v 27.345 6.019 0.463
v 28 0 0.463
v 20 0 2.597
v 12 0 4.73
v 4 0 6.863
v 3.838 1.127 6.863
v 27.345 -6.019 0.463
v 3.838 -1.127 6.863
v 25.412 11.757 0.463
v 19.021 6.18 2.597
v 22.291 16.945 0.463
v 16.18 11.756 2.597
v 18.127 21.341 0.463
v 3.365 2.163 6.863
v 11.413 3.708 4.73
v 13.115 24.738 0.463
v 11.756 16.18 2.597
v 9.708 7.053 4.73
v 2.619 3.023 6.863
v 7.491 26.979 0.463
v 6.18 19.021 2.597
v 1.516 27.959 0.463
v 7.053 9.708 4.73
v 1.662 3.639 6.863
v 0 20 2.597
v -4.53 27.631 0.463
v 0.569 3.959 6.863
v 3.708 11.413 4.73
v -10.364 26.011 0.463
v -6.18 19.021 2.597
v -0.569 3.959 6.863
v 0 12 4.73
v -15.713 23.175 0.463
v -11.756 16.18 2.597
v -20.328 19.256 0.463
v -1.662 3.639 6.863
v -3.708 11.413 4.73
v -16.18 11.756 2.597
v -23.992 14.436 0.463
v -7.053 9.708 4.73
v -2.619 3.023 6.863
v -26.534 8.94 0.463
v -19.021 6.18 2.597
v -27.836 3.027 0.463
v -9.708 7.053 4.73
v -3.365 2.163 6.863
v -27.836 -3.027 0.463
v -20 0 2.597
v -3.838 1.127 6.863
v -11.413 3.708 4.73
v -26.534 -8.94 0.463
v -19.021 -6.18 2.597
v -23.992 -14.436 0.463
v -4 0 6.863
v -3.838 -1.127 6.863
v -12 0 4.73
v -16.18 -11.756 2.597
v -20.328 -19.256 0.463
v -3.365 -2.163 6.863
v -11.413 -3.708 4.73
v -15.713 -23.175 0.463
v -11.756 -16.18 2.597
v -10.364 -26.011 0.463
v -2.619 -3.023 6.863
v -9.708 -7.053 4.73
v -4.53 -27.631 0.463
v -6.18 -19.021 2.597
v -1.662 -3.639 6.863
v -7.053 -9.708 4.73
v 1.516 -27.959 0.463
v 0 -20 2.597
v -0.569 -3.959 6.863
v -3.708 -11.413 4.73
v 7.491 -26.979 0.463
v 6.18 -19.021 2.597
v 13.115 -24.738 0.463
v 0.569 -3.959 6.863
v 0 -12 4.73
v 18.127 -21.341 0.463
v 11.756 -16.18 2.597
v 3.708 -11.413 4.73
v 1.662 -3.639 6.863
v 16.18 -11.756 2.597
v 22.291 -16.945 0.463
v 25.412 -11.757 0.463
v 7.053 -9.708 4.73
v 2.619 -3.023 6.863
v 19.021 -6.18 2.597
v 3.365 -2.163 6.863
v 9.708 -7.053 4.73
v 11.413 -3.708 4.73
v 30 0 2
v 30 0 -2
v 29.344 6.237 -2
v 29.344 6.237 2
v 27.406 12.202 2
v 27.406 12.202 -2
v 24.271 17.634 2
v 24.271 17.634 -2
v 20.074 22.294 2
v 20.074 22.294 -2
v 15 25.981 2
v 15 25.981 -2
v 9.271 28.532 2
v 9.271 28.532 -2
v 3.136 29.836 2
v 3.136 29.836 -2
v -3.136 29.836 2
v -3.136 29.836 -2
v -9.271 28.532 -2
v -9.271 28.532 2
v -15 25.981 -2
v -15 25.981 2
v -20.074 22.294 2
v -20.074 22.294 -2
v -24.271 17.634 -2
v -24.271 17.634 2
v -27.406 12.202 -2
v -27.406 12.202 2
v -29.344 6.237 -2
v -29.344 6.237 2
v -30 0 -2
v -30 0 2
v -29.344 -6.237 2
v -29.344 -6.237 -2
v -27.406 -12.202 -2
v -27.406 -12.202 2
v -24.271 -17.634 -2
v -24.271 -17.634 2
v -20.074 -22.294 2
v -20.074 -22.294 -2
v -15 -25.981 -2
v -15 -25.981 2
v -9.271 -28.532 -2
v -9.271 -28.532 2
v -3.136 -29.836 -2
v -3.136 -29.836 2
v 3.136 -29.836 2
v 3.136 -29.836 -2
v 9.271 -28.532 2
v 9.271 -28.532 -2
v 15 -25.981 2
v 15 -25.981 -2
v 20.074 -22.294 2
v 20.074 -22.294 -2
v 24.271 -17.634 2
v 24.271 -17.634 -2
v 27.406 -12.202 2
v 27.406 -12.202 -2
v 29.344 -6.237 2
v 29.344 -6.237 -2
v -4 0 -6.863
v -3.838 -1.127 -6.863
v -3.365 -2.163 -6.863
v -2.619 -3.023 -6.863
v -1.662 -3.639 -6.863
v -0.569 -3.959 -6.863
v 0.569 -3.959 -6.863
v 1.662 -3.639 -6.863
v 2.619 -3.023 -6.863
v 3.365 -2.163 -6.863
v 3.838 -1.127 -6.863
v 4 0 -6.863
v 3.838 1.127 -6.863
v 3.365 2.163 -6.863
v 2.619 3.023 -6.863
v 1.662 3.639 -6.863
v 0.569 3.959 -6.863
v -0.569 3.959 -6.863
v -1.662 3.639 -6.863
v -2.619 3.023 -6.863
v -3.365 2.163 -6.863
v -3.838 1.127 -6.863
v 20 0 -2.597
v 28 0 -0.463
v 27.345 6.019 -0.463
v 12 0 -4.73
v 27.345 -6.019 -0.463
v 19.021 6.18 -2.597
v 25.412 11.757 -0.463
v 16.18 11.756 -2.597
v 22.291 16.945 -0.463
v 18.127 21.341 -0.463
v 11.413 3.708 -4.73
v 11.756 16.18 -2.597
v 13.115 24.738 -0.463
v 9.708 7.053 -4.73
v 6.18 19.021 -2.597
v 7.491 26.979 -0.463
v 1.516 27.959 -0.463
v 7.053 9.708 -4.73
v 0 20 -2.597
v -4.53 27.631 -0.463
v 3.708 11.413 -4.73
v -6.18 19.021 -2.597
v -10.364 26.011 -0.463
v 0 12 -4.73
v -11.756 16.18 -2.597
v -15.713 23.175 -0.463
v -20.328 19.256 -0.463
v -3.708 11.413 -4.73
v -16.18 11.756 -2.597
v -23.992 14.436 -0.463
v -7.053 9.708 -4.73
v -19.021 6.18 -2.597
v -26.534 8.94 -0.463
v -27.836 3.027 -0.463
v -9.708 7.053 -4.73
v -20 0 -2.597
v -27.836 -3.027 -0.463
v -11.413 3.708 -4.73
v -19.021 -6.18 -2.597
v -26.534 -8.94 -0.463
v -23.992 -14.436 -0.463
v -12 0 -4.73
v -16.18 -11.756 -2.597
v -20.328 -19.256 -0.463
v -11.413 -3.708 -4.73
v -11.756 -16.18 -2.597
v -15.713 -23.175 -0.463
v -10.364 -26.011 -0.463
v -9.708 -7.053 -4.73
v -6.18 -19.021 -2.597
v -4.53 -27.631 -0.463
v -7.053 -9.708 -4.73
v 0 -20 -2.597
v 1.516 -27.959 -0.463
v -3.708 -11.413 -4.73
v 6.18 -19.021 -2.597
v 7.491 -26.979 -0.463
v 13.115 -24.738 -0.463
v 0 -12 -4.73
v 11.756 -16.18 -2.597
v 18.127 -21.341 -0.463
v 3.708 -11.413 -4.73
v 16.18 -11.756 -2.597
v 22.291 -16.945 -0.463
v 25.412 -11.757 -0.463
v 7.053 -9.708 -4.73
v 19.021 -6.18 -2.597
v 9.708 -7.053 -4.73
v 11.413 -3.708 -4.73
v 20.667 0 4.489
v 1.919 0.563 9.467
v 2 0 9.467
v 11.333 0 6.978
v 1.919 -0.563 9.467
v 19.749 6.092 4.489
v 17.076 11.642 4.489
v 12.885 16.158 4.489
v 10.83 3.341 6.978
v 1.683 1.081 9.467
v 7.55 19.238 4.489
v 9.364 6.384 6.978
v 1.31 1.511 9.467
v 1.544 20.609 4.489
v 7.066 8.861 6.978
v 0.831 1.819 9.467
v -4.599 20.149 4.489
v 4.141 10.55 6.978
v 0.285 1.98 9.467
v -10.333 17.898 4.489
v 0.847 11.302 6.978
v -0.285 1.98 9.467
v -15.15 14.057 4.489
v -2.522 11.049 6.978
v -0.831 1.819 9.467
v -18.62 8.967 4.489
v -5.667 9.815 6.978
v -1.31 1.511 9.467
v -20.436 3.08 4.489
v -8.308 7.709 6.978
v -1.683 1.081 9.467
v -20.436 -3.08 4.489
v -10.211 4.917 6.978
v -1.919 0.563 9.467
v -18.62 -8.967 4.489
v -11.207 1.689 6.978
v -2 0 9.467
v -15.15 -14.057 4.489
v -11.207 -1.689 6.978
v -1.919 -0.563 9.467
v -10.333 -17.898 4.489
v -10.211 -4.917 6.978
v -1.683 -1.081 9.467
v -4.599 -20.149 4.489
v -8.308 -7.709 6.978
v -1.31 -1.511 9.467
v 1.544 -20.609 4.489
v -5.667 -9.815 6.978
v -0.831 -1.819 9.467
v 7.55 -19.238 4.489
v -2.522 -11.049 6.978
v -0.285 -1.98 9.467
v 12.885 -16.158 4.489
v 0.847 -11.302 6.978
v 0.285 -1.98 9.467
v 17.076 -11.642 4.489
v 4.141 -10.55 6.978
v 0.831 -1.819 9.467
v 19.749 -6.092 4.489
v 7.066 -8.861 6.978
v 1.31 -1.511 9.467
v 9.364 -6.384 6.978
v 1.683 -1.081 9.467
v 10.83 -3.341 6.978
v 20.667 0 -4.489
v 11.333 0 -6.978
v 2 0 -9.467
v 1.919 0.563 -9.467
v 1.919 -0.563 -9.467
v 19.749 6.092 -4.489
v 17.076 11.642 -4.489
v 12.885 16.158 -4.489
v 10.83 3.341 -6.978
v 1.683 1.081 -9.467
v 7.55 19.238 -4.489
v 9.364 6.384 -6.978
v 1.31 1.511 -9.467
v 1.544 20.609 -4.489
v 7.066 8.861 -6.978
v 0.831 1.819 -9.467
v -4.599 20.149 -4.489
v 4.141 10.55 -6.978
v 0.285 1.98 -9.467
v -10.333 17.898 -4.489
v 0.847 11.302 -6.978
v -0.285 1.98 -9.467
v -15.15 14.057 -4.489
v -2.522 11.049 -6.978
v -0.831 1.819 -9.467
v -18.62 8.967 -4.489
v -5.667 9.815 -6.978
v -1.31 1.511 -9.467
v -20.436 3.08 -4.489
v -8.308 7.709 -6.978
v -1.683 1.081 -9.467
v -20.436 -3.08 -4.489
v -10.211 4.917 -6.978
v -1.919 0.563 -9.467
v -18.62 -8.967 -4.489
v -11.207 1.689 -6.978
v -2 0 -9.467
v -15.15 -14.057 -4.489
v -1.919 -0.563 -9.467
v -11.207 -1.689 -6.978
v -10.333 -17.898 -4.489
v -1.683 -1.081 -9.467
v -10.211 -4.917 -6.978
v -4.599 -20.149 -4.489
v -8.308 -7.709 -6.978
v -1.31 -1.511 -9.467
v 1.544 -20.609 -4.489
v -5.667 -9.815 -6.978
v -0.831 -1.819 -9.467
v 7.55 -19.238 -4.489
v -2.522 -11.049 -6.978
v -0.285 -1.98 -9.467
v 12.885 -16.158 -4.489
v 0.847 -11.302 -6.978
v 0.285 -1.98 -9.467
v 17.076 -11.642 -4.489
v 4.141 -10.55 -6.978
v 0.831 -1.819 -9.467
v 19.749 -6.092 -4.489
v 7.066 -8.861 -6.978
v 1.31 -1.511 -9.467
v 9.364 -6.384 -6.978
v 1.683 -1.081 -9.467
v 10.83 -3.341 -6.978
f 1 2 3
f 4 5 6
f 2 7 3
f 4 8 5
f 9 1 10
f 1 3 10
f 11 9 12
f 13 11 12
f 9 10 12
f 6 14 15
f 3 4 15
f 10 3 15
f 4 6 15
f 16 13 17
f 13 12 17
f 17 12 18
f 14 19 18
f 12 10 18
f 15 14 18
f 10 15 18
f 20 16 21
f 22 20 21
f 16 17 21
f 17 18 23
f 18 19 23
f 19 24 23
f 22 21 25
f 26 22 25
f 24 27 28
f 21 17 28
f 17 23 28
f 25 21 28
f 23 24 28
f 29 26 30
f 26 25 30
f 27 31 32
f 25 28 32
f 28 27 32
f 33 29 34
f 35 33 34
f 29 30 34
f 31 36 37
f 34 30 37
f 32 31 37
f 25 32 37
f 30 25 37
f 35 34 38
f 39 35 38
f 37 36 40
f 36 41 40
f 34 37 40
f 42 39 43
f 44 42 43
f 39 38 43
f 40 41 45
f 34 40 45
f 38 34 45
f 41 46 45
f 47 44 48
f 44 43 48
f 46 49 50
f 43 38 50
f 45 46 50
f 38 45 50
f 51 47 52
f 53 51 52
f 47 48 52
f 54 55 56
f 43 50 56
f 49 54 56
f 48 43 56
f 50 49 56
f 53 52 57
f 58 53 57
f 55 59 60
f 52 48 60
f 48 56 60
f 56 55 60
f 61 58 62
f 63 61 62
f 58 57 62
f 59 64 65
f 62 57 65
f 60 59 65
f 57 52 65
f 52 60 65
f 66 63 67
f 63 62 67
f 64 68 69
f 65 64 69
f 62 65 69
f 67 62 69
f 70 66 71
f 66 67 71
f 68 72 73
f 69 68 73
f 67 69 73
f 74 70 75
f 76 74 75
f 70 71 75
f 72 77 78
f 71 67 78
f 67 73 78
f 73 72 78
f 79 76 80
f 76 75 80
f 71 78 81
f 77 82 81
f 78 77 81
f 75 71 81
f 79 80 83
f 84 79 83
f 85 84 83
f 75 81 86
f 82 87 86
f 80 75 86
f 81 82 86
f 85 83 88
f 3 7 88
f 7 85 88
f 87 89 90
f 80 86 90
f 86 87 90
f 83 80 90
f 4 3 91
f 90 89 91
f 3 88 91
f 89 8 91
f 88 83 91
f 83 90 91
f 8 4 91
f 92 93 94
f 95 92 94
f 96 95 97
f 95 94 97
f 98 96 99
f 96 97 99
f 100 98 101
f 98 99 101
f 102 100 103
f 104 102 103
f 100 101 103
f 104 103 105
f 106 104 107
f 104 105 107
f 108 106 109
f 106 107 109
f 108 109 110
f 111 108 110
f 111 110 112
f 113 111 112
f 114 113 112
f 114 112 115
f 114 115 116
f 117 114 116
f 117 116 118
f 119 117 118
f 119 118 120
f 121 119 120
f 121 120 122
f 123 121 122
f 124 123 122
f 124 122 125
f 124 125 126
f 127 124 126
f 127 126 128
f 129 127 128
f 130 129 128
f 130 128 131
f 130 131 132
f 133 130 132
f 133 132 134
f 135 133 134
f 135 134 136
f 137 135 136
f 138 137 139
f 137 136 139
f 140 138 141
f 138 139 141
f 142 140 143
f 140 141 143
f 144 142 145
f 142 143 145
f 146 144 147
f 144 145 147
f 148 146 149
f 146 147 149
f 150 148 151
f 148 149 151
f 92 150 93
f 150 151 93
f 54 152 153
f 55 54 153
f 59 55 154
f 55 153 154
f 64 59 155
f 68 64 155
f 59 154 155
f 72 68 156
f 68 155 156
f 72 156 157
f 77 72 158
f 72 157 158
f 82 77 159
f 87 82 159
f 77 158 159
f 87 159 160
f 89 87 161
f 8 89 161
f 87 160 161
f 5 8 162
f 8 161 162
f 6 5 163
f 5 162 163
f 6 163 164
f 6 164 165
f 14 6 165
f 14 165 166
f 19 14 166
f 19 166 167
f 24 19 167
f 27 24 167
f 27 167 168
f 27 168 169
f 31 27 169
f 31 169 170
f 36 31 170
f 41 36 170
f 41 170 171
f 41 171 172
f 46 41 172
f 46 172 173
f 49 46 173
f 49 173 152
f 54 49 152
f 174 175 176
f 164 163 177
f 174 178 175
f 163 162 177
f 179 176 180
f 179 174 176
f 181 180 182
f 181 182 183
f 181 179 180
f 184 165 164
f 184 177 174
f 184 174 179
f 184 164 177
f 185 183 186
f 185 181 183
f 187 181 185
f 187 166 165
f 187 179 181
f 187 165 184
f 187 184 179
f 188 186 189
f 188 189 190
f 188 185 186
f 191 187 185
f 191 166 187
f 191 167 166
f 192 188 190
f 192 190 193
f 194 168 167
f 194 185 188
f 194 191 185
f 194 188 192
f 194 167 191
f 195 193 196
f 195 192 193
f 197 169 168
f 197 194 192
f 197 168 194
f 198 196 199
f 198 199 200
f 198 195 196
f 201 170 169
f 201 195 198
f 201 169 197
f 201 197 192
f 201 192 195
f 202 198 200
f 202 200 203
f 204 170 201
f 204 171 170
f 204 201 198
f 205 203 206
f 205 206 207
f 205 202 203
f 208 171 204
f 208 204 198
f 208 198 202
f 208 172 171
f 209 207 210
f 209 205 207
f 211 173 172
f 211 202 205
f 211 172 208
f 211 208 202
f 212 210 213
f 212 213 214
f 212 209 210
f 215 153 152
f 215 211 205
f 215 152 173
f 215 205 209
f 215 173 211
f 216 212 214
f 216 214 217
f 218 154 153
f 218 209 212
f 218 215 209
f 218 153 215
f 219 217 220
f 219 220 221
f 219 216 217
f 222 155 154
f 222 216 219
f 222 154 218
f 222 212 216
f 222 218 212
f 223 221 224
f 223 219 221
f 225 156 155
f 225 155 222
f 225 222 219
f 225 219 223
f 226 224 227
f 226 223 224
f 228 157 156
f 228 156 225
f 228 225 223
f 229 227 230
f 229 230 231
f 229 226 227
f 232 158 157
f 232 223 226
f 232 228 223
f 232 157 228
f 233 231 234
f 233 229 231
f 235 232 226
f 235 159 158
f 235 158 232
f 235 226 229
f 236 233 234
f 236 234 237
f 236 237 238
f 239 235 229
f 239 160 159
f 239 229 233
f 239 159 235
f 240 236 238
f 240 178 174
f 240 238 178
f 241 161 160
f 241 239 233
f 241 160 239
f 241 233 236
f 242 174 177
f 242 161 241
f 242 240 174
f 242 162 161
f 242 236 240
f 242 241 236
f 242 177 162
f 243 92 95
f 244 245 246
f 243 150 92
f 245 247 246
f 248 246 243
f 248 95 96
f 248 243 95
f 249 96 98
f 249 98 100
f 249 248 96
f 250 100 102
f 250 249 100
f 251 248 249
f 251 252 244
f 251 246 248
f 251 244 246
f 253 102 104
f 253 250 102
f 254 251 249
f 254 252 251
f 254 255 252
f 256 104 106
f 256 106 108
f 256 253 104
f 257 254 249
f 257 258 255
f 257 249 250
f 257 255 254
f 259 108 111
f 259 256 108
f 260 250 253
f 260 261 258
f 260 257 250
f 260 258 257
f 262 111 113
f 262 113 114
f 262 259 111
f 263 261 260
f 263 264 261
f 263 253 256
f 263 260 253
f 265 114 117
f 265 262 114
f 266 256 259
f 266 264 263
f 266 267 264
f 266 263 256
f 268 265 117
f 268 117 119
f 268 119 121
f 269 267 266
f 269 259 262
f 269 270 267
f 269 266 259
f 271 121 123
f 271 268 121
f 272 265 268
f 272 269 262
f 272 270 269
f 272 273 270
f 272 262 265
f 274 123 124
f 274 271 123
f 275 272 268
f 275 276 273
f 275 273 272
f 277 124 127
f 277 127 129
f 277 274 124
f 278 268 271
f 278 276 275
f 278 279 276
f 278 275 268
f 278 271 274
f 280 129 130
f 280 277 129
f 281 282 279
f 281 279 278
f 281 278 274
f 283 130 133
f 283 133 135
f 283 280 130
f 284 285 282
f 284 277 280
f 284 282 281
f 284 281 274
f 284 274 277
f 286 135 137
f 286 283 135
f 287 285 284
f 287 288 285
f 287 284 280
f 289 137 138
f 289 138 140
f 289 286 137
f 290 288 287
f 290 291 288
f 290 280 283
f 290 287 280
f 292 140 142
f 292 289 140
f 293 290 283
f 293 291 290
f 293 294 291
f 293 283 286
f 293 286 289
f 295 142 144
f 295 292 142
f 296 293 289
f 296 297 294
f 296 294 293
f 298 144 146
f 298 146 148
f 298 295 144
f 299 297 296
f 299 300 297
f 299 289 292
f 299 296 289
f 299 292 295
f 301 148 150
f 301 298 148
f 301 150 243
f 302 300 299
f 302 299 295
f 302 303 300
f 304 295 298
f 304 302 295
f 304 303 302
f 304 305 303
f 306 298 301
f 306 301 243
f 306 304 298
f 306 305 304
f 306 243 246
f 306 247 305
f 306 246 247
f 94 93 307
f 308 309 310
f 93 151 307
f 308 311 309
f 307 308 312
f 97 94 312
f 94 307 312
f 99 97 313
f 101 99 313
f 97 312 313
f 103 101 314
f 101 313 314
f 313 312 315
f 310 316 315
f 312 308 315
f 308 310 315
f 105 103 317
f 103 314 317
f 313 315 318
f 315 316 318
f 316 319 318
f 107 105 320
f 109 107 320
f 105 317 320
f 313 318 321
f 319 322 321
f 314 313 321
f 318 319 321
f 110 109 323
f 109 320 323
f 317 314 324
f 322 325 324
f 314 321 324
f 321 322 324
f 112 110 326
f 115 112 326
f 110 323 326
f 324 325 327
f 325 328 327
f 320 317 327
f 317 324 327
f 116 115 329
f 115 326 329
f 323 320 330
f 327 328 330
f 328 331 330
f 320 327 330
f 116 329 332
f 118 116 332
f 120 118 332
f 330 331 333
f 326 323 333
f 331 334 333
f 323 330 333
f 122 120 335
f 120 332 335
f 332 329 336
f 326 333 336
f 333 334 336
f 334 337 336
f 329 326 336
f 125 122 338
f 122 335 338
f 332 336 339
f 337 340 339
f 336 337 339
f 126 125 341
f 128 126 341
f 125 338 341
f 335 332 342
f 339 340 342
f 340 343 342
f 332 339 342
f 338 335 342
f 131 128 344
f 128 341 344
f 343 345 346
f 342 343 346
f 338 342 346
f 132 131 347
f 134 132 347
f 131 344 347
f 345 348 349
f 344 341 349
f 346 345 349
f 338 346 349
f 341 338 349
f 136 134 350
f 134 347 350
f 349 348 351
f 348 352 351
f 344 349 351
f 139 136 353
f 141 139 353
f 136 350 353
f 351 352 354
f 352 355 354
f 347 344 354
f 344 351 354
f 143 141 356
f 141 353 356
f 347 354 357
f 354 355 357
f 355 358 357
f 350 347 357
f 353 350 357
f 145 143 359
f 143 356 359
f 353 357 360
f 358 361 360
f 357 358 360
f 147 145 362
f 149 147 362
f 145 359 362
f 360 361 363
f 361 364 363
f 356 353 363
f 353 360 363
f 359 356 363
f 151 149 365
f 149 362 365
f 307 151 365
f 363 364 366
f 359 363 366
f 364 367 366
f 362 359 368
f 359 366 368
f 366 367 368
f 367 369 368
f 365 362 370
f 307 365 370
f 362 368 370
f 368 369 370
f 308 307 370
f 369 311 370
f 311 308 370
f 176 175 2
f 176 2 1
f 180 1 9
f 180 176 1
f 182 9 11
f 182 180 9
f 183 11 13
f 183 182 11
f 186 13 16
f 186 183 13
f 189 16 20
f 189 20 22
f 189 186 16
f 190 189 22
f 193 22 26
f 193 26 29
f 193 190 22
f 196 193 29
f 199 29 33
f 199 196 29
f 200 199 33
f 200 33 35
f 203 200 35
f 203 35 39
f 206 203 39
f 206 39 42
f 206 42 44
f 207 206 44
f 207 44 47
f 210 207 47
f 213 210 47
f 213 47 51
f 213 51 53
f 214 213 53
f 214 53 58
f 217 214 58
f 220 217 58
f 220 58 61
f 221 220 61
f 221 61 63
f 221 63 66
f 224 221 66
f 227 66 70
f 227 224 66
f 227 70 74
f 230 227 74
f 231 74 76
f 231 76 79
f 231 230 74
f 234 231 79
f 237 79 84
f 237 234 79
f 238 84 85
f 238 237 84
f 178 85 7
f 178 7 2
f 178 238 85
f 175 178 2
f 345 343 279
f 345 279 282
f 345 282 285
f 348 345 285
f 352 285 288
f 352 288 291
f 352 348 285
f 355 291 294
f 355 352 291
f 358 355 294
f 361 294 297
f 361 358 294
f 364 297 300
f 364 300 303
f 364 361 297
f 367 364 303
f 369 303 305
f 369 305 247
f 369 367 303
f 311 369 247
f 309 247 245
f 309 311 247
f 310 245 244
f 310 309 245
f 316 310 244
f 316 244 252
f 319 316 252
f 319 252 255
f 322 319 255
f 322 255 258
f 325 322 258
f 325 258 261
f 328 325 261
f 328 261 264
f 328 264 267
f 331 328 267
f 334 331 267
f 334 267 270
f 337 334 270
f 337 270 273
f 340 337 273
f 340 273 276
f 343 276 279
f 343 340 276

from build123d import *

# Parameters (mm, degrees)
F3_D = 4
F4_T = -2


with BuildPart() as f1:
    # F0 (on Front) → F1 (revolve)
    with BuildSketch(Plane.XZ):
        Polygon((0, 10), (0, 0), (30, 0), (30, 2), align=None)
    revolve(axis=Axis((0, 0, 5), (0, 0, 1)))

    # F3 (through all)
    with Locations(Plane(origin=(0, 0, 0), x_dir=(1, 0, 0), z_dir=(0, 0, -1))):
        with Locations((0, 0)):
            Hole(F3_D / 2)

    # F4
    f4_openings = [f1.faces().sort_by_distance(p)[0] for p in [
        (-29.151472, 0, 0),
    ]]
    offset(amount=F4_T, openings=f4_openings)

    # F5: F1 across plane


with BuildPart() as f1_1:
    add(f1.part)
    add(f1.part.mirror(Plane.XY))


solid = f1_1.part
